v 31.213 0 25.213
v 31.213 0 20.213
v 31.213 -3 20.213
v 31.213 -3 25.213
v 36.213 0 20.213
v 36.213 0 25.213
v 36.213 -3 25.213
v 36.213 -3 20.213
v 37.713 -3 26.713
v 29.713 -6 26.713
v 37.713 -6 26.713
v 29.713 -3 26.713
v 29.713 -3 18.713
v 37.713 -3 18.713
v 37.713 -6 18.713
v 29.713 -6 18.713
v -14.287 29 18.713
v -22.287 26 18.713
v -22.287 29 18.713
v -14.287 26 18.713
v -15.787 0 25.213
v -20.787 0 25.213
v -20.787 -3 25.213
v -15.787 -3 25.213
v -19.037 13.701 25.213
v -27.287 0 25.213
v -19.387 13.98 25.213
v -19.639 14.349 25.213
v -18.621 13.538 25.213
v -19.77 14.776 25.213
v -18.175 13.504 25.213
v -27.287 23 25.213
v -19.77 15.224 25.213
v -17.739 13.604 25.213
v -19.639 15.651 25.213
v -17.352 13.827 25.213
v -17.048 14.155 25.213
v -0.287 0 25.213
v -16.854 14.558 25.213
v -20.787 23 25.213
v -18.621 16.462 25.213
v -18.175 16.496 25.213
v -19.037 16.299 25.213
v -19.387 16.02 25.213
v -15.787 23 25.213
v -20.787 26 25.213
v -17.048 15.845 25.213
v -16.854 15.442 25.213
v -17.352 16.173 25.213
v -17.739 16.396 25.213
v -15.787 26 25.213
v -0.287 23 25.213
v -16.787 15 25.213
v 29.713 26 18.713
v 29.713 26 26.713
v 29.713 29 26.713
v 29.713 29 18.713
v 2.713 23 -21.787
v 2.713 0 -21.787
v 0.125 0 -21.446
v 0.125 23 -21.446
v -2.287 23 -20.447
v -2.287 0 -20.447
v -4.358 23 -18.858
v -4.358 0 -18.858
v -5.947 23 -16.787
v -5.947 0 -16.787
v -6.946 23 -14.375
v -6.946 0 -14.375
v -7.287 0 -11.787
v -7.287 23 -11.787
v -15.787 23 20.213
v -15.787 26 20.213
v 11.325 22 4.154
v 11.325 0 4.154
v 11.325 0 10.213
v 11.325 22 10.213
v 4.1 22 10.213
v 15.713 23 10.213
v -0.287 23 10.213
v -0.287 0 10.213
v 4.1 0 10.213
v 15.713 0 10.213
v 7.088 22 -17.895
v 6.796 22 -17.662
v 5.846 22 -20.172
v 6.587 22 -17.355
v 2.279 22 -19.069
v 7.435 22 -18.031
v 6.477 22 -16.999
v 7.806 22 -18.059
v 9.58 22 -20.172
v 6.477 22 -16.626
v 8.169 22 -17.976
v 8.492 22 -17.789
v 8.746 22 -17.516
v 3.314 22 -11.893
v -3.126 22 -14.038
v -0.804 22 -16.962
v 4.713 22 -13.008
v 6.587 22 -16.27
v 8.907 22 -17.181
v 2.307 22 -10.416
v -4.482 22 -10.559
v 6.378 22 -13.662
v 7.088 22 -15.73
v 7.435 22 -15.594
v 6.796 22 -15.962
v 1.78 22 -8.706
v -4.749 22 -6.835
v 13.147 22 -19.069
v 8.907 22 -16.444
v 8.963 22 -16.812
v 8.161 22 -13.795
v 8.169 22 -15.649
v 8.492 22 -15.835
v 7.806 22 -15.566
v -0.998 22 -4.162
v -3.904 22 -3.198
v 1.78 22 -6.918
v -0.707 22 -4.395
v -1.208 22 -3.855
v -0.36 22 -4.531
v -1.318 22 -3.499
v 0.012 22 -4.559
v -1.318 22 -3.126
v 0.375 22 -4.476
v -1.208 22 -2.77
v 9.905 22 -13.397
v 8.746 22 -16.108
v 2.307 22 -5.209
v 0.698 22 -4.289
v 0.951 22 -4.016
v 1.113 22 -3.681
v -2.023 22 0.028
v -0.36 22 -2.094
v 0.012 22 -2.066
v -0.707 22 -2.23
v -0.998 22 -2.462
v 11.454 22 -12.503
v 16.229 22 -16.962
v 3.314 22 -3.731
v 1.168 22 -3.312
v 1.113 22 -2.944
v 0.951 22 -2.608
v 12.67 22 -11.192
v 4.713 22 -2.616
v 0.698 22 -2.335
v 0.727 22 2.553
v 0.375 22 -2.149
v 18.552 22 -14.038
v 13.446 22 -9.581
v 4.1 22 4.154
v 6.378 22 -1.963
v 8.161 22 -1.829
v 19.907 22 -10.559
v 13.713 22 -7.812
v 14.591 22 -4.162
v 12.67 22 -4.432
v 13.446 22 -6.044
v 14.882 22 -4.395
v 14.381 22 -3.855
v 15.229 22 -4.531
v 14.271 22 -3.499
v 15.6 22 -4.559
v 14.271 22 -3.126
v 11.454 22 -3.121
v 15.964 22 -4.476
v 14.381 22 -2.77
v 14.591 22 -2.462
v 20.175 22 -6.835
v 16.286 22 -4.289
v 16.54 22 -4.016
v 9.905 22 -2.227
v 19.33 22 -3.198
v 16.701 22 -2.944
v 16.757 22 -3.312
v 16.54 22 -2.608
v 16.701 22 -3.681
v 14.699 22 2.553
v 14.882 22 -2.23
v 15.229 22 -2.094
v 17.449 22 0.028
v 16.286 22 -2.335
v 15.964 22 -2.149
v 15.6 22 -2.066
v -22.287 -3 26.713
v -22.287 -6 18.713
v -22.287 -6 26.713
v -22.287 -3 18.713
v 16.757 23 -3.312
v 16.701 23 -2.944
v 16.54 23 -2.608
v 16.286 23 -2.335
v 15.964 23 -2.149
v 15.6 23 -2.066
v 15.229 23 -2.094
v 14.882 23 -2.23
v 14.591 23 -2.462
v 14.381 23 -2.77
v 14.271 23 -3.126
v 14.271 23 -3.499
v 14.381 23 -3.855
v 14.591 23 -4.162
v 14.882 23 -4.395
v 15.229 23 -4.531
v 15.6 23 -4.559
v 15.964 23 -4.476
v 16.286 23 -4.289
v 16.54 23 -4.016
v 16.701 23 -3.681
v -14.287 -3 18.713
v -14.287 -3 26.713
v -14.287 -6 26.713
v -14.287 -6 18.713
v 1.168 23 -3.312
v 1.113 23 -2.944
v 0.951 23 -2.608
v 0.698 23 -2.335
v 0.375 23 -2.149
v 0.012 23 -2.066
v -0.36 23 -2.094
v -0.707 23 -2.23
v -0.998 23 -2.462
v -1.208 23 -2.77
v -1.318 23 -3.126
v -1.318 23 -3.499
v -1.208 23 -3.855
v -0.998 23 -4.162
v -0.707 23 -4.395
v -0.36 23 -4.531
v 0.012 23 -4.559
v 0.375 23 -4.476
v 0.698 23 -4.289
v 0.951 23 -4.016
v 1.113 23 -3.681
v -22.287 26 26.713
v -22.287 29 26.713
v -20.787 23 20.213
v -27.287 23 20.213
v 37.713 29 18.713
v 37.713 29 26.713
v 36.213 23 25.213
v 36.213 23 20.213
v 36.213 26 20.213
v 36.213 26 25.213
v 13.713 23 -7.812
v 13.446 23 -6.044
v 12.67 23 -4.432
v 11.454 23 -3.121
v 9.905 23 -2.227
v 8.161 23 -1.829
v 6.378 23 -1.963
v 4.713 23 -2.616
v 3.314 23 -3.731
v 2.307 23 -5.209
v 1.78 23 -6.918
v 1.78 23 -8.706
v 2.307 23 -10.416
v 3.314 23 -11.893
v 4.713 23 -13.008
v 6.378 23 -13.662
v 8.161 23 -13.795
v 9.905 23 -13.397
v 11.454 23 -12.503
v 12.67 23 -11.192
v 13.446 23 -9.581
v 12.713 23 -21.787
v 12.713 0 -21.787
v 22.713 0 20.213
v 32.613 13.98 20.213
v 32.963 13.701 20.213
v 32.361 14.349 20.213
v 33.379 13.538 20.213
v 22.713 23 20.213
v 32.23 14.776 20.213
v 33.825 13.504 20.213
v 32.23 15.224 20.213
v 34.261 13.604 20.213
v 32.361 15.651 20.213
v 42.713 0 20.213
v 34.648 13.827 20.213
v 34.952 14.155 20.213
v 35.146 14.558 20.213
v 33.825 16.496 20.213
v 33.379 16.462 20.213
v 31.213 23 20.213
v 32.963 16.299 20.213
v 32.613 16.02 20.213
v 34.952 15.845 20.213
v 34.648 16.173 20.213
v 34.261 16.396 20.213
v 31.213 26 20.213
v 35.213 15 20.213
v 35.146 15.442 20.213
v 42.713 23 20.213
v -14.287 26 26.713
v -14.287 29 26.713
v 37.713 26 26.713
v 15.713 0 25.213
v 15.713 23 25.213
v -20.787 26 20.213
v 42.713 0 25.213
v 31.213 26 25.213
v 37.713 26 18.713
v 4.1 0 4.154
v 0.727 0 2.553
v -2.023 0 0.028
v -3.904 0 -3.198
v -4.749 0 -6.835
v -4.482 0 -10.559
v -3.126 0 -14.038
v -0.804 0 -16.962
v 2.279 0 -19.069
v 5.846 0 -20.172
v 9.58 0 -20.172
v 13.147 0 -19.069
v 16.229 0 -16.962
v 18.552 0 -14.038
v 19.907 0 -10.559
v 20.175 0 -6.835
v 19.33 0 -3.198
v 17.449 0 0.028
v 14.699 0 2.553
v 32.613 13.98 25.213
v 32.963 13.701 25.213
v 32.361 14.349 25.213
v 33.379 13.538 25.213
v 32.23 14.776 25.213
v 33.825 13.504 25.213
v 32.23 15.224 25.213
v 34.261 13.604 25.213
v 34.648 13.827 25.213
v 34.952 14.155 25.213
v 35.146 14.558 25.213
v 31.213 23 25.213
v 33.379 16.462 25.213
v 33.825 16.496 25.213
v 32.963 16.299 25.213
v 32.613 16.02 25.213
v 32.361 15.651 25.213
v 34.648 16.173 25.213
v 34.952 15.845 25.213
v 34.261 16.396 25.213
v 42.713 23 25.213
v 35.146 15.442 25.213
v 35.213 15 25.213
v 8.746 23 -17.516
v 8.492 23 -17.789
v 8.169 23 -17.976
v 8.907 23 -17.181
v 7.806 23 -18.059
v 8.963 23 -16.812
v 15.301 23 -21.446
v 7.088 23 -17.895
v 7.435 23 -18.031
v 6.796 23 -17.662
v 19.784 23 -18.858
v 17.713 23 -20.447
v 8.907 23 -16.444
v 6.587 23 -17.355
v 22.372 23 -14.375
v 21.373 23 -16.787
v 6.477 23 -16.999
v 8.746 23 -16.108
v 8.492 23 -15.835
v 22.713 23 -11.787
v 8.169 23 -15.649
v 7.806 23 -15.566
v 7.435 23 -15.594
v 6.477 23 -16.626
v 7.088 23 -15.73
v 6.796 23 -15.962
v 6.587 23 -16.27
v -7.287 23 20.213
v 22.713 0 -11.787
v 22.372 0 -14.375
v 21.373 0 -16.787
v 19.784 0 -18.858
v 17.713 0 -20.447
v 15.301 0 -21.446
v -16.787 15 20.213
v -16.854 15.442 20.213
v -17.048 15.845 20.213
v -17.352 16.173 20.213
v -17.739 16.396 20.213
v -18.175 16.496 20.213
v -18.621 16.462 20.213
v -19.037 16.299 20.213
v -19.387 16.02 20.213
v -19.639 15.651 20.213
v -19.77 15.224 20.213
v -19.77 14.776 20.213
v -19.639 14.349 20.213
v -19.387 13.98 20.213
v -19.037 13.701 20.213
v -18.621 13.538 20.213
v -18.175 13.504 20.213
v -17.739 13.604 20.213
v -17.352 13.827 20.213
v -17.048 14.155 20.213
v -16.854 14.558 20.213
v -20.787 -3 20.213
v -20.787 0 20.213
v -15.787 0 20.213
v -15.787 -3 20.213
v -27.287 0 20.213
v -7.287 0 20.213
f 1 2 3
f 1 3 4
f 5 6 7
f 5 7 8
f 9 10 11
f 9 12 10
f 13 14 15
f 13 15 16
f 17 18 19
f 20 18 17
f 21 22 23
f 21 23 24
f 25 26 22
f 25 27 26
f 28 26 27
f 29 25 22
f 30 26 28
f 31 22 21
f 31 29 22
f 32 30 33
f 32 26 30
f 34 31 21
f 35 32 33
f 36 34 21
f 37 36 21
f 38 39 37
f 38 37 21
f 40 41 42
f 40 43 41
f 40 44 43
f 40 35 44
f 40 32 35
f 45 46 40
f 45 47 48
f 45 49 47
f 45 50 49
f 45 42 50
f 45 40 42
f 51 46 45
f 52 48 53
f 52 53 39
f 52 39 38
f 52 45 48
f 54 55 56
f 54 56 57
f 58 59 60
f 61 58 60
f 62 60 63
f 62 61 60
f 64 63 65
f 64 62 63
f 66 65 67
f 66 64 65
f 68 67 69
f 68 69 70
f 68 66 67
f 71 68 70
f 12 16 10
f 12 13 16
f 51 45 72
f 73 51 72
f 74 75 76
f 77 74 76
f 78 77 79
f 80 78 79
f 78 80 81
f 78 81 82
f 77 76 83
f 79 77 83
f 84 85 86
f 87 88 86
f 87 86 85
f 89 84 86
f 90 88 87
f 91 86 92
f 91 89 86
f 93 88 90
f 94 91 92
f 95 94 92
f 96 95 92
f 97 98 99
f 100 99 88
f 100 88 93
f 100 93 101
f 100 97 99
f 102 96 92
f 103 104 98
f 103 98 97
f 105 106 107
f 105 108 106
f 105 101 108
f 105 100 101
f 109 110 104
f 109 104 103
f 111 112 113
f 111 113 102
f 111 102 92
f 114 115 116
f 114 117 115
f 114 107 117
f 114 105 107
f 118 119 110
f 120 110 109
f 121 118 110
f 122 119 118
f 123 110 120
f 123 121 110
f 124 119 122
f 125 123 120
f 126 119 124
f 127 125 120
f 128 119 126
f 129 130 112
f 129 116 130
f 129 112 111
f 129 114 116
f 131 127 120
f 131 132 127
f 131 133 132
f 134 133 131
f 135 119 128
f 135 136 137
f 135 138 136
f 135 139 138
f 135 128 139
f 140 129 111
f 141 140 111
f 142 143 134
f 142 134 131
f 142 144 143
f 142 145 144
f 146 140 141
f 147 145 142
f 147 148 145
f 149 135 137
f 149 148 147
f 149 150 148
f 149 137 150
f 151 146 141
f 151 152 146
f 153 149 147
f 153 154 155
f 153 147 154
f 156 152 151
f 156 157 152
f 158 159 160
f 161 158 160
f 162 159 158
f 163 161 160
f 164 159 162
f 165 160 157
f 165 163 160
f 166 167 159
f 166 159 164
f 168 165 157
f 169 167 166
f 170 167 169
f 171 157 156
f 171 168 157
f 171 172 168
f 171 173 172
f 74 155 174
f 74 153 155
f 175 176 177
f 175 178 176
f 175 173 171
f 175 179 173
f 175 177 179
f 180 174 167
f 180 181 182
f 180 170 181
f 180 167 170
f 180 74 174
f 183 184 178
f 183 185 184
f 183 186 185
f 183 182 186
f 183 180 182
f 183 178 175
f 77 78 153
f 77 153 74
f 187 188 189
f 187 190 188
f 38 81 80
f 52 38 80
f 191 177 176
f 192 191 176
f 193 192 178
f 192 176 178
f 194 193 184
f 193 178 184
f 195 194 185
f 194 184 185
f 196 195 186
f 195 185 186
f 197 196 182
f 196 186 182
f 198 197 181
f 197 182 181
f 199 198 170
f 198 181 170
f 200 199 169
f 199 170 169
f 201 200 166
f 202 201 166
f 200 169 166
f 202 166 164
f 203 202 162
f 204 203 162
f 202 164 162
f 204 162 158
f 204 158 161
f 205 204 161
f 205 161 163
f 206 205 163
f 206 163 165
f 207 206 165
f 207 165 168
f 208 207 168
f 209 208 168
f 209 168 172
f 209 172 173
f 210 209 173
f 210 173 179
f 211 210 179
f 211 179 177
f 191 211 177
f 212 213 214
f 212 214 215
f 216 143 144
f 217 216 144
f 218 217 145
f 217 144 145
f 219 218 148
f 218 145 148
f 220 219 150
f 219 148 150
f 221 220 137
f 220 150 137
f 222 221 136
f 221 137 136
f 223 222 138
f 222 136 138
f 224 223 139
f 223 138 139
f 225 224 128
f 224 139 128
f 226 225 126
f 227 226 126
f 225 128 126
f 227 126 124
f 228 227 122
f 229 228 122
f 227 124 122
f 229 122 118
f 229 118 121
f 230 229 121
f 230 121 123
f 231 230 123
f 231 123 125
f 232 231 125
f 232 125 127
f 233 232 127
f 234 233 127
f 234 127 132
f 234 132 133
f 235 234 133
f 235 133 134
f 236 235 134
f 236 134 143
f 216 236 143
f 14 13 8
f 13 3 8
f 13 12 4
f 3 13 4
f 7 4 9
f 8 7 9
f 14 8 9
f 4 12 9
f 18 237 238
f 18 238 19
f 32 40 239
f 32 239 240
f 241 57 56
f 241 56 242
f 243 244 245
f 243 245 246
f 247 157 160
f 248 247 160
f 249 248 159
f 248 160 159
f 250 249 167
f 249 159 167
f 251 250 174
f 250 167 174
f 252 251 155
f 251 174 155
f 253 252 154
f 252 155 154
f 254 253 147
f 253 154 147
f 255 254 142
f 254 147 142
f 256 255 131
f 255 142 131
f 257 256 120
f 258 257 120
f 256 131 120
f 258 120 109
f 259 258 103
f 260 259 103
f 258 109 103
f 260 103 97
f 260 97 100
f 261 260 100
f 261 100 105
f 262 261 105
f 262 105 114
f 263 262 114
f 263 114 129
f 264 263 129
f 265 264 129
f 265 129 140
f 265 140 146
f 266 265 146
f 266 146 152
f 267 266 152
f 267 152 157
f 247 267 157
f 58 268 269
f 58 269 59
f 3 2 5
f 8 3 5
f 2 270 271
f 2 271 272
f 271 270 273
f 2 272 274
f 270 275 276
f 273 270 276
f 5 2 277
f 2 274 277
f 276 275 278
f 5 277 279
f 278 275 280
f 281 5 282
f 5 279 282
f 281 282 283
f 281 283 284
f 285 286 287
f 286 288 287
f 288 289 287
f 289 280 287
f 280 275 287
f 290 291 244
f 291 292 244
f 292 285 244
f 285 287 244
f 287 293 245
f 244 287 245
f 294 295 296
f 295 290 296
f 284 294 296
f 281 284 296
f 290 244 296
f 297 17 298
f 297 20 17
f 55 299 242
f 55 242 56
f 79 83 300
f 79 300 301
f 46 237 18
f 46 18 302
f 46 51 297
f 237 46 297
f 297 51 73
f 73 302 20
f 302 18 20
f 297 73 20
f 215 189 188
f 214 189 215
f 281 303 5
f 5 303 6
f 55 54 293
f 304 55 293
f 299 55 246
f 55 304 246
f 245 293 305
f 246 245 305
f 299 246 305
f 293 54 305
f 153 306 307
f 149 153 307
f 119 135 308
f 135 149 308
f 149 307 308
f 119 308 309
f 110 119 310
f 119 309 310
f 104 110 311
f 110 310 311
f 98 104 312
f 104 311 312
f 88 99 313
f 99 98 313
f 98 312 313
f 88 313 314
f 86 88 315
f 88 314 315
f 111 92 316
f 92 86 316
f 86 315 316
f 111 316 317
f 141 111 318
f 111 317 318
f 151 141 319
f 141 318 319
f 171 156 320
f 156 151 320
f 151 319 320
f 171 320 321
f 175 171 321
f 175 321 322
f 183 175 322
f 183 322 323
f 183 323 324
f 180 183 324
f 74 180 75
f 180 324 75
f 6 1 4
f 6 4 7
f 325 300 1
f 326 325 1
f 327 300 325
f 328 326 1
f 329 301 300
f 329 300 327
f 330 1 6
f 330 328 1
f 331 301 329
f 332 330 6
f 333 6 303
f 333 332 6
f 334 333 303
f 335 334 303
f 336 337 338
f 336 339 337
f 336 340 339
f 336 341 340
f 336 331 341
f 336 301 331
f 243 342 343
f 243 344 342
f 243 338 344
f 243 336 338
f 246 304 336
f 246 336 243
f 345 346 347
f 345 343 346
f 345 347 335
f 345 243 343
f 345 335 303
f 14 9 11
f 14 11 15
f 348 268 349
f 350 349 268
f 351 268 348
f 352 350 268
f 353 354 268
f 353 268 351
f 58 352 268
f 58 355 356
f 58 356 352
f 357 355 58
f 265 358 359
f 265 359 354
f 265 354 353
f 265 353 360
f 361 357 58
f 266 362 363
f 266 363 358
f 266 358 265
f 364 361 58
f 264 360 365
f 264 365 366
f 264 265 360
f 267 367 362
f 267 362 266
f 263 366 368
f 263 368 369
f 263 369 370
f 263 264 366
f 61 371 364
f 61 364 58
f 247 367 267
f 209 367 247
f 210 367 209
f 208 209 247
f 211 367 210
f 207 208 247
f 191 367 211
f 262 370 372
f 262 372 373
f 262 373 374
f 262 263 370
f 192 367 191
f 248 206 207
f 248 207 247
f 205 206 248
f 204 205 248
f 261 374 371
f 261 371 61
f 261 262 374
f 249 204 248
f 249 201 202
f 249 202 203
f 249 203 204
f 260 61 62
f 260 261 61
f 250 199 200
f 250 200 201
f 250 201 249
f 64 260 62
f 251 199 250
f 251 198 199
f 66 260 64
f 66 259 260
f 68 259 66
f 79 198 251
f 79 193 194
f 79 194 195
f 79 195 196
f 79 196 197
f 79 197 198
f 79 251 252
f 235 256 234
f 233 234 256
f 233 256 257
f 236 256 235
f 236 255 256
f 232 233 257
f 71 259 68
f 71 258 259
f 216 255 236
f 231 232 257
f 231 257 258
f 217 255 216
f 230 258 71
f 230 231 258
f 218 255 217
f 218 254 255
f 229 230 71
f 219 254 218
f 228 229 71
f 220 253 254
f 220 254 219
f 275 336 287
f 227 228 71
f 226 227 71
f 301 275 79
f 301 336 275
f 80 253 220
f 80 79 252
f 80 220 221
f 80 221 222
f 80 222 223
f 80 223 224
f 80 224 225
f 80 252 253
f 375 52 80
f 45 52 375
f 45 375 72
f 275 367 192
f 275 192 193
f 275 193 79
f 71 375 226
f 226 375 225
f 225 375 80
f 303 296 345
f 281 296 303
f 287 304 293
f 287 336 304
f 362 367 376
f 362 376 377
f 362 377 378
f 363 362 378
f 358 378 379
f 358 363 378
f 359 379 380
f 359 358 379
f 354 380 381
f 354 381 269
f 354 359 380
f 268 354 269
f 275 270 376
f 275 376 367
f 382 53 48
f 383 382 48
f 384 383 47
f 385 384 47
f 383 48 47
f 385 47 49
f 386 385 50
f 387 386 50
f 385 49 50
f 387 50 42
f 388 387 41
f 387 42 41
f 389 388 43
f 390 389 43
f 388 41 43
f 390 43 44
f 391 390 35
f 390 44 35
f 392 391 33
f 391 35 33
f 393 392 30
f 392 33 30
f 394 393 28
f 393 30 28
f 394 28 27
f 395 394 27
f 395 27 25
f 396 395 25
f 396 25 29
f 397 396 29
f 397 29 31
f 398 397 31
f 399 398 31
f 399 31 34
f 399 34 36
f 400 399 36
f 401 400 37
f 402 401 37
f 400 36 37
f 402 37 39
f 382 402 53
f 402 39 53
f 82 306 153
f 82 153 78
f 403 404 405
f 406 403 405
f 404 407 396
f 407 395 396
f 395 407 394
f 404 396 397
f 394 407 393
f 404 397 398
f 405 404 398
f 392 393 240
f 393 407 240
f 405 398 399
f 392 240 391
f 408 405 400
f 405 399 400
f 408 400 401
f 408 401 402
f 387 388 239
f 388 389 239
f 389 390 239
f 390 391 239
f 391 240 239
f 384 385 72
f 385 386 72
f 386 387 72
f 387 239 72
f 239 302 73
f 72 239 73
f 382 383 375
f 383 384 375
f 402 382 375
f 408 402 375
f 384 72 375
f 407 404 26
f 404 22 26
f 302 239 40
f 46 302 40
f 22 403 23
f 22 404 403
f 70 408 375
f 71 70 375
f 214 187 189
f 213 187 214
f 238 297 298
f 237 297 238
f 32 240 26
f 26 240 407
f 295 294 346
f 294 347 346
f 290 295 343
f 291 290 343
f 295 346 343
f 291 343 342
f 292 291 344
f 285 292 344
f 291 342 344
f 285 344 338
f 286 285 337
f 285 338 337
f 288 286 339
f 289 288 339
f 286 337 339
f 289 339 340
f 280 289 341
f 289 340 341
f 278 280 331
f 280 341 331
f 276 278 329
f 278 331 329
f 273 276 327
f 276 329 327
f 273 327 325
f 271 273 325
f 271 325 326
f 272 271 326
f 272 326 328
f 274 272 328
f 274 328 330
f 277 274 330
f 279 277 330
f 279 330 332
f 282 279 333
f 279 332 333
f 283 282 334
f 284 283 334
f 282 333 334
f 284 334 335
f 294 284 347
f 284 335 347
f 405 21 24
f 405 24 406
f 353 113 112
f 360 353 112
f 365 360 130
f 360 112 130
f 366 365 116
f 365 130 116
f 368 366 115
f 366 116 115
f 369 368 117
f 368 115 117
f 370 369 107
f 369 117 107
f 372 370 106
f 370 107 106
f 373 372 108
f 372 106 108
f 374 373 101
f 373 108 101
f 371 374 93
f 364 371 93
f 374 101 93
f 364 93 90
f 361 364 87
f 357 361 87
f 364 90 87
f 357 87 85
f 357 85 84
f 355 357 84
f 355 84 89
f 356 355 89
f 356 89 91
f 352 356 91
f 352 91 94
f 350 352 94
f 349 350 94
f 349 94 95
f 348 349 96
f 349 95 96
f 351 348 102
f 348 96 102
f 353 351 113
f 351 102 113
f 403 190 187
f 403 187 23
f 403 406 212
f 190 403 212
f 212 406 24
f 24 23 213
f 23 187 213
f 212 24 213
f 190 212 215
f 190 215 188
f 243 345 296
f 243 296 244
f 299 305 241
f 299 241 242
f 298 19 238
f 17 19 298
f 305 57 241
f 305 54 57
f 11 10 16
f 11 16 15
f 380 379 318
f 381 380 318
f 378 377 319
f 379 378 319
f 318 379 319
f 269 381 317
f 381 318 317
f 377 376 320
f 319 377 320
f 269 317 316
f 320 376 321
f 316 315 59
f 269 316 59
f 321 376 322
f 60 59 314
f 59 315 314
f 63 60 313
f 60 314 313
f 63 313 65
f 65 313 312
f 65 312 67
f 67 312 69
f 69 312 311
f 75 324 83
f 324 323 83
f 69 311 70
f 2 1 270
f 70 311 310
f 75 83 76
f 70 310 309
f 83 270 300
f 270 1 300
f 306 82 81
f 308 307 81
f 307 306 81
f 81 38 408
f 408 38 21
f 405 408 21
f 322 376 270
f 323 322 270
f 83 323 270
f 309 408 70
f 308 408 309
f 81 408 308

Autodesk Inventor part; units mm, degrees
ref_plane "YZ Plane" through (0, 0, 0) normal (1, 0, 0) x (0, 1, 0)
ref_plane "XZ Plane" through (0, 0, 0) normal (0, 1, 0) x (-1, 0, 0)
ref_plane "XY Plane" through (0, 0, 0) normal (0, 0, 1) x (1, 0, 0)
sketch "Esquisse1" plane through (0, 0, 0) normal (0, 1, 0) x (-1, 0, 0)
  line L0 (7.2872, 10.2128) -> (-22.7128, 10.2128)
  line L1 (-22.7128, 10.2128) -> (-22.7128, -19.7872)
  line L2 (-22.7128, -19.7872) -> (7.2872, -19.7872)
  line L3 (7.2872, -19.7872) -> (7.2872, 10.2128)
  point P0 (0, 0)
  dimension "d0" = 30
  dimension "d1" = 30
extrude "Extrusion1" add sketch "Esquisse1" along normal blind 23
ref_plane "Plan médian" through (7.7128, 0, 10.2128) normal (1, 0, 0) x (0, 0, -1)
sketch "Esquisse4" plane through (0, 0, 0) normal (0, -1, 0) x (1, 0, 0)
  circle A0 centre (7.7128, -7.8122) radius 11.975 projected
  line L0 (-7.2872, 10.2128) -> (22.7128, 10.2128) projected
  line L1 (4.1002, 3.6049) -> (4.1002, 10.2128)
  line L2 (11.3254, 3.6049) -> (11.3254, 10.2128)
  point P0 (0, 0)
extrude "Extrusion2" cut sketch "Esquisse4" against normal blind 22
sketch "Esquisse5" plane through (0, 22, 0) normal (0, -1, 0) x (1, 0, 0)
  circle A0 centre (15.507, -3.3122) radius 1.25 projected
  circle A1 centre (-0.0815, -3.3122) radius 1.25 projected
  circle A2 centre (7.7128, -16.8122) radius 1.25 projected
  circle A3 centre (7.7128, -7.8122) radius 6 projected
  point P0 (0, 0)
extrude "Extrusion3" cut sketch "Esquisse5" against normal through all
sketch "Esquisse6" plane through (-7.2872, 23, 10.2128) normal (0, 0, 1) x (1, 0, 0)
  line L0 (0, -23) -> (11.3874, -23) projected
  line L1 (5.9558, 0) -> (8.4558, 0) projected
  line L2 (0, -23) -> (7, -23)
  line L3 (7, -23) -> (7, 0)
  line L4 (7, 0) -> (0, 0)
  line L5 (0, 0) -> (0, -23)
  line L6 (30, -23) -> (30, 0) projected
  line L7 (0, 0) -> (30, 0) projected
  line L8 (30, -23) -> (23, -23)
  line L9 (23, -23) -> (23, 0)
  line L10 (23, 0) -> (30, 0)
  line L11 (30, 0) -> (30, -23)
  point P0 (7.2872, -23)
  point P1 (12, -23)
  point P2 (11.5355, -23)
  dimension "d8" = 7
  dimension "d9" = 7
extrude "Extrusion4" add sketch "Esquisse6" along normal blind 10
sketch "Esquisse7" plane through (-7.2872, 23, 20.2128) normal (0, 0, 1) x (1, 0, 0)
  line L0 (7, 0) -> (-20, 0)
  line L1 (-20, 0) -> (-20, -23)
  line L2 (-20, -23) -> (7, -23)
  line L3 (7, -23) -> (7, 0)
  line L4 (30, 0) -> (0, 0) projected
  line L5 (23, 0) -> (50, 0)
  line L6 (50, 0) -> (50, -23)
  line L7 (50, -23) -> (23, -23)
  line L8 (23, -23) -> (23, 0)
  line L9 (0, 0) -> (0, -23) projected
  line L10 (30, -23) -> (30, 0) projected
  point P0 (7.2872, -23)
  dimension "d12" = 20
  dimension "d13" = 20
extrude "Extrusion5" add sketch "Esquisse7" along normal blind 5
sketch "Esquisse8" plane through (0, 23, 0) normal (0, 1, 0) x (1, 0, 0)
  line L0 (36.2128, -25.2128) -> (31.2128, -25.2128)
  line L1 (31.2128, -25.2128) -> (31.2128, -20.2128)
  line L2 (31.2128, -20.2128) -> (36.2128, -20.2128)
  line L3 (36.2128, -20.2128) -> (36.2128, -25.2128)
  line L4 (42.7128, -20.2128) -> (42.7128, -25.2128) projected
  line L5 (42.7128, -20.2128) -> (22.7128, -20.2128) projected
  line L6 (-0.2872, -25.2128) -> (-27.2872, -25.2128) projected
  line L7 (-27.2872, -20.2128) -> (-27.2872, -25.2128) projected
  line L8 (-20.7872, -25.2128) -> (-15.7872, -25.2128)
  line L9 (-15.7872, -25.2128) -> (-15.7872, -20.2128)
  line L10 (-15.7872, -20.2128) -> (-20.7872, -20.2128)
  line L11 (-20.7872, -20.2128) -> (-20.7872, -25.2128)
  line L12 (-7.2872, -20.2128) -> (-27.2872, -20.2128) projected
  point P0 (0, 0)
  point P1 (-0.4939, -25.2128)
  dimension "d16" = 6.5
  dimension "d17" = 5
  dimension "d18" = 5
  dimension "d19" = 0
  dimension "d53" = 5
  dimension "d54" = 5
  dimension "d55" = 0
  dimension "d57" = 6.5
extrude "Extrusion6" add sketch "Esquisse8" along normal blind 3 contours L0 L1 L2 L3 | L6 L11 L10 L9
sketch "Esquisse9" plane through (0, 26, 0) normal (0, 1, 0) x (1, 0, 0)
  line L0 (37.7128, -26.7128) -> (29.7128, -26.7128)
  line L1 (29.7128, -26.7128) -> (29.7128, -18.7128)
  line L2 (29.7128, -18.7128) -> (37.7128, -18.7128)
  line L3 (37.7128, -18.7128) -> (37.7128, -26.7128)
  line L4 (42.7128, -20.2128) -> (42.7128, -25.2128) projected
  line L5 (-27.2872, -25.2128) -> (-0.2872, -25.2128) projected
  line L6 (-27.2872, -20.2128) -> (-27.2872, -25.2128) projected
  line L7 (31.2128, -25.2128) -> (15.7128, -25.2128) projected
  line L8 (-14.2872, -26.7128) -> (-22.2872, -26.7128)
  line L9 (-22.2872, -26.7128) -> (-22.2872, -18.7128)
  line L10 (-22.2872, -18.7128) -> (-14.2872, -18.7128)
  line L11 (-14.2872, -18.7128) -> (-14.2872, -26.7128)
  point P0 (0, 0)
  point P1 (-13.7872, -25.2128)
  dimension "d25" = 8
  dimension "d26" = 5
  dimension "d59" = 8
  dimension "d60" = 1.5
  dimension "d62" = 5
  dimension "d63" = 1.5
  dimension "d64" = 8
  dimension "d65" = 8
extrude "Extrusion7" add sketch "Esquisse9" along normal blind 3
sketch "Esquisse10" plane through (22.7128, 23, -19.7872) normal (0, 0, -1) x (-1, 0, 0)
  line L0 (0, -23) -> (15, -23) projected
  line L1 (15, -23) -> (15, -1) projected
  line L2 (15, -23) -> (30, -23) projected
  line L3 (30, -23) -> (30, 0) projected
  line L4 (0, 0) -> (30, 0) projected
  line L5 (0, -23) -> (0, 0) projected
  line L6 (0, 0) -> (30, 0)
  line L7 (30, 0) -> (30, -23)
  line L8 (30, -23) -> (0, -23)
  line L9 (0, -23) -> (0, 0)
  point P0 (22.7128, -23)
extrude "Extrusion8" add sketch "Esquisse10" along normal blind 2
fillet "Congé1" radius 10 2 edges at (22.7128, 11.5, -21.7872) (-7.2872, 11.5, -21.7872)
sketch "Esquisse12" plane through (0, 0, 0) normal (0, -1, 0) x (1, 0, 0)
  arc A0 (4.1002, 3.6049) -> (11.3254, 3.6049) centre (7.7128, -7.8122) ccw projected
  circle A1 centre (7.7128, -7.8122) radius 12.5
  point P0 (0, 0)
  dimension "d42" = 25
extrude "Extrusion10" cut sketch "Esquisse12" against normal up to surface (22 mm away)
sketch "Esquisse13" plane through (-7.2872, 23, 25.2128) normal (0, 0, 1) x (1, 0, 0)
  circle A0 centre (-11, -8) radius 1.5
  circle A1 centre (41, -8) radius 1.5
  line L0 (7, 0) -> (-20, 0) projected
  line L1 (-20, 0) -> (-20, -23) projected
  line L2 (50, 0) -> (23, 0) projected
  line L3 (50, -23) -> (50, 0) projected
  point P0 (7.2872, -23)
  dimension "d45" = 3
  dimension "d46" = 3
  dimension "d49" = 8
  dimension "d50" = 9
  dimension "d51" = 8
  dimension "d52" = 9
extrude "Extrusion11" cut sketch "Esquisse13" against normal through all
sketch "Esquisse14" plane through (0, 0, 0) normal (0, -1, 0) x (1, 0, 0)
  line L0 (15.7128, 25.2128) -> (42.7128, 25.2128) projected
  line L1 (22.7128, 20.2128) -> (42.7128, 20.2128) projected
  line L2 (-20.7872, 25.2128) -> (-15.7872, 25.2128)
  line L3 (-15.7872, 25.2128) -> (-15.7872, 20.2128)
  line L4 (-15.7872, 20.2128) -> (-20.7872, 20.2128)
  line L5 (-20.7872, 20.2128) -> (-20.7872, 25.2128)
  line L6 (-27.2872, 20.2128) -> (-27.2872, 25.2128) projected
  line L7 (31.2128, 25.2128) -> (36.2128, 25.2128)
  line L8 (36.2128, 25.2128) -> (36.2128, 20.2128)
  line L9 (36.2128, 20.2128) -> (31.2128, 20.2128)
  line L10 (31.2128, 20.2128) -> (31.2128, 25.2128)
  line L11 (42.7128, 20.2128) -> (42.7128, 25.2128) projected
  point P0 (0, 0)
  dimension "d66" = 6.5
  dimension "d67" = 5
  dimension "d69" = 5
  dimension "d70" = 6.5
  dimension "d71" = 5
  dimension "d72" = 5
  dimension "d73" = 0
extrude "Extrusion12" add sketch "Esquisse14" along normal blind 3 contours L0 L8 L1 L10 | L2 L3 L4 L5
sketch "Esquisse15" plane through (0, -3, 0) normal (0, -1, 0) x (1, 0, 0)
  line L0 (-22.2872, 26.7128) -> (-14.2872, 26.7128)
  line L1 (-14.2872, 26.7128) -> (-14.2872, 18.7128)
  line L2 (-14.2872, 18.7128) -> (-22.2872, 18.7128)
  line L3 (-22.2872, 18.7128) -> (-22.2872, 26.7128)
  line L4 (29.7128, 26.7128) -> (37.7128, 26.7128)
  line L5 (37.7128, 26.7128) -> (37.7128, 18.7128)
  line L6 (37.7128, 18.7128) -> (29.7128, 18.7128)
  line L7 (29.7128, 18.7128) -> (29.7128, 26.7128)
  line L8 (-27.2872, 20.2128) -> (-27.2872, 25.2128) projected
  line L9 (-27.2872, 20.2128) -> (-20.7872, 20.2128) projected
  line L10 (42.7128, 20.2128) -> (42.7128, 25.2128) projected
  line L11 (36.2128, 20.2128) -> (42.7128, 20.2128) projected
  point P0 (0, 0)
  dimension "d76" = 8
  dimension "d77" = 8
  dimension "d78" = 8
  dimension "d79" = 8
  dimension "d80" = 5
  dimension "d81" = 1.5
  dimension "d82" = 5
  dimension "d83" = 1.5
extrude "Extrusion13" add sketch "Esquisse15" along normal blind 3
properties part number "support_codeur"
